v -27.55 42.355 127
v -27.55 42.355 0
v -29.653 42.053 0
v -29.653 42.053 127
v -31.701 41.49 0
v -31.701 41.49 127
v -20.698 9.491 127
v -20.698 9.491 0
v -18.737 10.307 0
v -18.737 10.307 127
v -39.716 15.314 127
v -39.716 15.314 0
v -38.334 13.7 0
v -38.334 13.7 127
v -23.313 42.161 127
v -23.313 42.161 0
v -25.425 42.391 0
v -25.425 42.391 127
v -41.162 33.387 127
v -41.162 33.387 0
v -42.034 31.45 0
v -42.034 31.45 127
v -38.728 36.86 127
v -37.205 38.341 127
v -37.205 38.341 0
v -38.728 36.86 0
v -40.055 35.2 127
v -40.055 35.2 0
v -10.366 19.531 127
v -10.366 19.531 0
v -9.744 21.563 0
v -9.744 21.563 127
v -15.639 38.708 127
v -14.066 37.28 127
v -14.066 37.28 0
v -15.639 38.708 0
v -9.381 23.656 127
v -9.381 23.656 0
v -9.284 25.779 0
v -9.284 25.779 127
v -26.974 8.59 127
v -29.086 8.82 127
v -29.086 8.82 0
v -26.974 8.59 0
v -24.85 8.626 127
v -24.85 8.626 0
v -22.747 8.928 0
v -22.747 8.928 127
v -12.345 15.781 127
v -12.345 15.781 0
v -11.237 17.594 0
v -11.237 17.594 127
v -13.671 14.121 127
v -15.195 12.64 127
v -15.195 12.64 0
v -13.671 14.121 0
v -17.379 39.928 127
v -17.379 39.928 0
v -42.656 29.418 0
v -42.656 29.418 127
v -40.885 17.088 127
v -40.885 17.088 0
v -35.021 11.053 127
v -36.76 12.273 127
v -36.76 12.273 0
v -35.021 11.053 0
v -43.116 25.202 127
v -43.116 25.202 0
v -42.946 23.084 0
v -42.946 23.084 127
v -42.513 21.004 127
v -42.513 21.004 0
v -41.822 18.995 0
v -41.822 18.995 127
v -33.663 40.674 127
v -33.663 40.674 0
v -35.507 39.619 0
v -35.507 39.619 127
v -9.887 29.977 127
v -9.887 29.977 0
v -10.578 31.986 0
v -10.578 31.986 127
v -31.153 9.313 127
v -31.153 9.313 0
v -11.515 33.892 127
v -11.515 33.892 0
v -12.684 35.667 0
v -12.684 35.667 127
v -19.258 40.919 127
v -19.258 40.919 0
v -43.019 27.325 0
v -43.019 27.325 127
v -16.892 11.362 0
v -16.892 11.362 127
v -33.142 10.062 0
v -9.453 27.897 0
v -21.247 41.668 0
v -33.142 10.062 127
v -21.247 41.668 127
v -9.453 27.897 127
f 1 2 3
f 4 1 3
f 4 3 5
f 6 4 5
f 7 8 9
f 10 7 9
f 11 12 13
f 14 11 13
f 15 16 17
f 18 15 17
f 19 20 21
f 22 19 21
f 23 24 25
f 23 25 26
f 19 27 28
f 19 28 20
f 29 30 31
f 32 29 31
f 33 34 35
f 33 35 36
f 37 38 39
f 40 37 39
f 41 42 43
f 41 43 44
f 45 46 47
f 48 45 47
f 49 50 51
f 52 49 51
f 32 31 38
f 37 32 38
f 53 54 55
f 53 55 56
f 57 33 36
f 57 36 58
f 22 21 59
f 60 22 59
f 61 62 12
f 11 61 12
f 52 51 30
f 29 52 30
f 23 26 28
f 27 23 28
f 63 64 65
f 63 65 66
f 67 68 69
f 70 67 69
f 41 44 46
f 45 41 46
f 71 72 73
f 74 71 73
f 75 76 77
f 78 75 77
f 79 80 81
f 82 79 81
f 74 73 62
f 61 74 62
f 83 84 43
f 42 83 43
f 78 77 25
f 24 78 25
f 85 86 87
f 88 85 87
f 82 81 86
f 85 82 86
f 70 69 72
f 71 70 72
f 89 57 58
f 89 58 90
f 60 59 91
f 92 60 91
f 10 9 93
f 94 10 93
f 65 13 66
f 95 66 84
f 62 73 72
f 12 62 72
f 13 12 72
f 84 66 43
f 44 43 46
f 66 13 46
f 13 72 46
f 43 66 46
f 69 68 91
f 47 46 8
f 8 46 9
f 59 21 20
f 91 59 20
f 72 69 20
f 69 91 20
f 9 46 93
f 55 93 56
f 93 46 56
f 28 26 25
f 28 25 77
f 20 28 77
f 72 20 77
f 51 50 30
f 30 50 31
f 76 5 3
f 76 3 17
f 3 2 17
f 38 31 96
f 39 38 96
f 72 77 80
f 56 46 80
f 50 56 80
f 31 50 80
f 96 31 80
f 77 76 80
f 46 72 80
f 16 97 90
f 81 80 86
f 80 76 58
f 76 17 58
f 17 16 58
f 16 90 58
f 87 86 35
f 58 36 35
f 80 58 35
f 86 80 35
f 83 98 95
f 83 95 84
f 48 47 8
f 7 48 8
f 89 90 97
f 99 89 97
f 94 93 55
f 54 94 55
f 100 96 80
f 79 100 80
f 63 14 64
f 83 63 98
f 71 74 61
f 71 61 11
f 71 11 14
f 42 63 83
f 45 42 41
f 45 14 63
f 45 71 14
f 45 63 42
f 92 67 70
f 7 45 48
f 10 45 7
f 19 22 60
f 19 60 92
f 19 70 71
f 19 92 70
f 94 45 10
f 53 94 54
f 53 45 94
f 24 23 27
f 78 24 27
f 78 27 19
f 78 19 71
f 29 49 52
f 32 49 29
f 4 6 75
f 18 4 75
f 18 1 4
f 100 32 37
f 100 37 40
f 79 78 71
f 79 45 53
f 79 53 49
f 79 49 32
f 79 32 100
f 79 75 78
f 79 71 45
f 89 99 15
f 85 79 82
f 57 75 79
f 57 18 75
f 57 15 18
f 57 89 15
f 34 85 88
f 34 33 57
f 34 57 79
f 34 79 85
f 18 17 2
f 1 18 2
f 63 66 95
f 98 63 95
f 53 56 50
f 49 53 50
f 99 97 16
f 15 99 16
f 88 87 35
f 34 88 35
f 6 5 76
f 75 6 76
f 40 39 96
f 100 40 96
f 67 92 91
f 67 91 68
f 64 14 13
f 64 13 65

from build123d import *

# Parameters (mm, degrees)
F1_DEPTH = 127


with BuildPart() as f1:
    # F0 (on Top) → F1 (new body)
    with BuildSketch(Plane.XY):
        Polygon((-22.746946, 8.928029), (-20.69835, 9.491393), (-18.736516, 10.307072), (-16.892383, 11.362202), (-15.195034, 12.640143), (-13.671238, 14.120742), (-12.345026, 15.780647), (-11.237312, 17.593683), (-10.365567, 19.531255), (-9.743538, 21.562808), (-9.381035, 23.656302), (-9.283775, 25.778722), (-9.453292, 27.896596), (-9.886912, 29.976523), (-10.577796, 31.985704), (-11.51505, 33.89245), (-12.683892, 35.666692), (-14.065889, 37.280448), (-15.639246, 38.70827), (-17.37915, 39.927639), (-19.258161, 40.919325), (-21.246647, 41.667689), (-23.313249, 42.160928), (-25.425374, 42.391264), (-27.549713, 42.355065), (-29.652763, 42.0529), (-31.70136, 41.489536), (-33.663194, 40.673857), (-35.507327, 39.618727), (-37.204676, 38.340786), (-38.728472, 36.860188), (-40.054684, 35.200282), (-41.162397, 33.387247), (-42.034143, 31.449674), (-42.656172, 29.418122), (-43.018675, 27.324628), (-43.115935, 25.202208), (-42.946418, 23.084334), (-42.512798, 21.004406), (-41.821914, 18.995226), (-40.88466, 17.08848), (-39.715818, 15.314238), (-38.333821, 13.700481), (-36.760464, 12.272659), (-35.02056, 11.05329), (-33.141549, 10.061604), (-31.153062, 9.31324), (-29.086461, 8.820001), (-26.974336, 8.589665), (-24.849997, 8.625865), align=None)
    extrude(amount=F1_DEPTH)


solid = f1.part
